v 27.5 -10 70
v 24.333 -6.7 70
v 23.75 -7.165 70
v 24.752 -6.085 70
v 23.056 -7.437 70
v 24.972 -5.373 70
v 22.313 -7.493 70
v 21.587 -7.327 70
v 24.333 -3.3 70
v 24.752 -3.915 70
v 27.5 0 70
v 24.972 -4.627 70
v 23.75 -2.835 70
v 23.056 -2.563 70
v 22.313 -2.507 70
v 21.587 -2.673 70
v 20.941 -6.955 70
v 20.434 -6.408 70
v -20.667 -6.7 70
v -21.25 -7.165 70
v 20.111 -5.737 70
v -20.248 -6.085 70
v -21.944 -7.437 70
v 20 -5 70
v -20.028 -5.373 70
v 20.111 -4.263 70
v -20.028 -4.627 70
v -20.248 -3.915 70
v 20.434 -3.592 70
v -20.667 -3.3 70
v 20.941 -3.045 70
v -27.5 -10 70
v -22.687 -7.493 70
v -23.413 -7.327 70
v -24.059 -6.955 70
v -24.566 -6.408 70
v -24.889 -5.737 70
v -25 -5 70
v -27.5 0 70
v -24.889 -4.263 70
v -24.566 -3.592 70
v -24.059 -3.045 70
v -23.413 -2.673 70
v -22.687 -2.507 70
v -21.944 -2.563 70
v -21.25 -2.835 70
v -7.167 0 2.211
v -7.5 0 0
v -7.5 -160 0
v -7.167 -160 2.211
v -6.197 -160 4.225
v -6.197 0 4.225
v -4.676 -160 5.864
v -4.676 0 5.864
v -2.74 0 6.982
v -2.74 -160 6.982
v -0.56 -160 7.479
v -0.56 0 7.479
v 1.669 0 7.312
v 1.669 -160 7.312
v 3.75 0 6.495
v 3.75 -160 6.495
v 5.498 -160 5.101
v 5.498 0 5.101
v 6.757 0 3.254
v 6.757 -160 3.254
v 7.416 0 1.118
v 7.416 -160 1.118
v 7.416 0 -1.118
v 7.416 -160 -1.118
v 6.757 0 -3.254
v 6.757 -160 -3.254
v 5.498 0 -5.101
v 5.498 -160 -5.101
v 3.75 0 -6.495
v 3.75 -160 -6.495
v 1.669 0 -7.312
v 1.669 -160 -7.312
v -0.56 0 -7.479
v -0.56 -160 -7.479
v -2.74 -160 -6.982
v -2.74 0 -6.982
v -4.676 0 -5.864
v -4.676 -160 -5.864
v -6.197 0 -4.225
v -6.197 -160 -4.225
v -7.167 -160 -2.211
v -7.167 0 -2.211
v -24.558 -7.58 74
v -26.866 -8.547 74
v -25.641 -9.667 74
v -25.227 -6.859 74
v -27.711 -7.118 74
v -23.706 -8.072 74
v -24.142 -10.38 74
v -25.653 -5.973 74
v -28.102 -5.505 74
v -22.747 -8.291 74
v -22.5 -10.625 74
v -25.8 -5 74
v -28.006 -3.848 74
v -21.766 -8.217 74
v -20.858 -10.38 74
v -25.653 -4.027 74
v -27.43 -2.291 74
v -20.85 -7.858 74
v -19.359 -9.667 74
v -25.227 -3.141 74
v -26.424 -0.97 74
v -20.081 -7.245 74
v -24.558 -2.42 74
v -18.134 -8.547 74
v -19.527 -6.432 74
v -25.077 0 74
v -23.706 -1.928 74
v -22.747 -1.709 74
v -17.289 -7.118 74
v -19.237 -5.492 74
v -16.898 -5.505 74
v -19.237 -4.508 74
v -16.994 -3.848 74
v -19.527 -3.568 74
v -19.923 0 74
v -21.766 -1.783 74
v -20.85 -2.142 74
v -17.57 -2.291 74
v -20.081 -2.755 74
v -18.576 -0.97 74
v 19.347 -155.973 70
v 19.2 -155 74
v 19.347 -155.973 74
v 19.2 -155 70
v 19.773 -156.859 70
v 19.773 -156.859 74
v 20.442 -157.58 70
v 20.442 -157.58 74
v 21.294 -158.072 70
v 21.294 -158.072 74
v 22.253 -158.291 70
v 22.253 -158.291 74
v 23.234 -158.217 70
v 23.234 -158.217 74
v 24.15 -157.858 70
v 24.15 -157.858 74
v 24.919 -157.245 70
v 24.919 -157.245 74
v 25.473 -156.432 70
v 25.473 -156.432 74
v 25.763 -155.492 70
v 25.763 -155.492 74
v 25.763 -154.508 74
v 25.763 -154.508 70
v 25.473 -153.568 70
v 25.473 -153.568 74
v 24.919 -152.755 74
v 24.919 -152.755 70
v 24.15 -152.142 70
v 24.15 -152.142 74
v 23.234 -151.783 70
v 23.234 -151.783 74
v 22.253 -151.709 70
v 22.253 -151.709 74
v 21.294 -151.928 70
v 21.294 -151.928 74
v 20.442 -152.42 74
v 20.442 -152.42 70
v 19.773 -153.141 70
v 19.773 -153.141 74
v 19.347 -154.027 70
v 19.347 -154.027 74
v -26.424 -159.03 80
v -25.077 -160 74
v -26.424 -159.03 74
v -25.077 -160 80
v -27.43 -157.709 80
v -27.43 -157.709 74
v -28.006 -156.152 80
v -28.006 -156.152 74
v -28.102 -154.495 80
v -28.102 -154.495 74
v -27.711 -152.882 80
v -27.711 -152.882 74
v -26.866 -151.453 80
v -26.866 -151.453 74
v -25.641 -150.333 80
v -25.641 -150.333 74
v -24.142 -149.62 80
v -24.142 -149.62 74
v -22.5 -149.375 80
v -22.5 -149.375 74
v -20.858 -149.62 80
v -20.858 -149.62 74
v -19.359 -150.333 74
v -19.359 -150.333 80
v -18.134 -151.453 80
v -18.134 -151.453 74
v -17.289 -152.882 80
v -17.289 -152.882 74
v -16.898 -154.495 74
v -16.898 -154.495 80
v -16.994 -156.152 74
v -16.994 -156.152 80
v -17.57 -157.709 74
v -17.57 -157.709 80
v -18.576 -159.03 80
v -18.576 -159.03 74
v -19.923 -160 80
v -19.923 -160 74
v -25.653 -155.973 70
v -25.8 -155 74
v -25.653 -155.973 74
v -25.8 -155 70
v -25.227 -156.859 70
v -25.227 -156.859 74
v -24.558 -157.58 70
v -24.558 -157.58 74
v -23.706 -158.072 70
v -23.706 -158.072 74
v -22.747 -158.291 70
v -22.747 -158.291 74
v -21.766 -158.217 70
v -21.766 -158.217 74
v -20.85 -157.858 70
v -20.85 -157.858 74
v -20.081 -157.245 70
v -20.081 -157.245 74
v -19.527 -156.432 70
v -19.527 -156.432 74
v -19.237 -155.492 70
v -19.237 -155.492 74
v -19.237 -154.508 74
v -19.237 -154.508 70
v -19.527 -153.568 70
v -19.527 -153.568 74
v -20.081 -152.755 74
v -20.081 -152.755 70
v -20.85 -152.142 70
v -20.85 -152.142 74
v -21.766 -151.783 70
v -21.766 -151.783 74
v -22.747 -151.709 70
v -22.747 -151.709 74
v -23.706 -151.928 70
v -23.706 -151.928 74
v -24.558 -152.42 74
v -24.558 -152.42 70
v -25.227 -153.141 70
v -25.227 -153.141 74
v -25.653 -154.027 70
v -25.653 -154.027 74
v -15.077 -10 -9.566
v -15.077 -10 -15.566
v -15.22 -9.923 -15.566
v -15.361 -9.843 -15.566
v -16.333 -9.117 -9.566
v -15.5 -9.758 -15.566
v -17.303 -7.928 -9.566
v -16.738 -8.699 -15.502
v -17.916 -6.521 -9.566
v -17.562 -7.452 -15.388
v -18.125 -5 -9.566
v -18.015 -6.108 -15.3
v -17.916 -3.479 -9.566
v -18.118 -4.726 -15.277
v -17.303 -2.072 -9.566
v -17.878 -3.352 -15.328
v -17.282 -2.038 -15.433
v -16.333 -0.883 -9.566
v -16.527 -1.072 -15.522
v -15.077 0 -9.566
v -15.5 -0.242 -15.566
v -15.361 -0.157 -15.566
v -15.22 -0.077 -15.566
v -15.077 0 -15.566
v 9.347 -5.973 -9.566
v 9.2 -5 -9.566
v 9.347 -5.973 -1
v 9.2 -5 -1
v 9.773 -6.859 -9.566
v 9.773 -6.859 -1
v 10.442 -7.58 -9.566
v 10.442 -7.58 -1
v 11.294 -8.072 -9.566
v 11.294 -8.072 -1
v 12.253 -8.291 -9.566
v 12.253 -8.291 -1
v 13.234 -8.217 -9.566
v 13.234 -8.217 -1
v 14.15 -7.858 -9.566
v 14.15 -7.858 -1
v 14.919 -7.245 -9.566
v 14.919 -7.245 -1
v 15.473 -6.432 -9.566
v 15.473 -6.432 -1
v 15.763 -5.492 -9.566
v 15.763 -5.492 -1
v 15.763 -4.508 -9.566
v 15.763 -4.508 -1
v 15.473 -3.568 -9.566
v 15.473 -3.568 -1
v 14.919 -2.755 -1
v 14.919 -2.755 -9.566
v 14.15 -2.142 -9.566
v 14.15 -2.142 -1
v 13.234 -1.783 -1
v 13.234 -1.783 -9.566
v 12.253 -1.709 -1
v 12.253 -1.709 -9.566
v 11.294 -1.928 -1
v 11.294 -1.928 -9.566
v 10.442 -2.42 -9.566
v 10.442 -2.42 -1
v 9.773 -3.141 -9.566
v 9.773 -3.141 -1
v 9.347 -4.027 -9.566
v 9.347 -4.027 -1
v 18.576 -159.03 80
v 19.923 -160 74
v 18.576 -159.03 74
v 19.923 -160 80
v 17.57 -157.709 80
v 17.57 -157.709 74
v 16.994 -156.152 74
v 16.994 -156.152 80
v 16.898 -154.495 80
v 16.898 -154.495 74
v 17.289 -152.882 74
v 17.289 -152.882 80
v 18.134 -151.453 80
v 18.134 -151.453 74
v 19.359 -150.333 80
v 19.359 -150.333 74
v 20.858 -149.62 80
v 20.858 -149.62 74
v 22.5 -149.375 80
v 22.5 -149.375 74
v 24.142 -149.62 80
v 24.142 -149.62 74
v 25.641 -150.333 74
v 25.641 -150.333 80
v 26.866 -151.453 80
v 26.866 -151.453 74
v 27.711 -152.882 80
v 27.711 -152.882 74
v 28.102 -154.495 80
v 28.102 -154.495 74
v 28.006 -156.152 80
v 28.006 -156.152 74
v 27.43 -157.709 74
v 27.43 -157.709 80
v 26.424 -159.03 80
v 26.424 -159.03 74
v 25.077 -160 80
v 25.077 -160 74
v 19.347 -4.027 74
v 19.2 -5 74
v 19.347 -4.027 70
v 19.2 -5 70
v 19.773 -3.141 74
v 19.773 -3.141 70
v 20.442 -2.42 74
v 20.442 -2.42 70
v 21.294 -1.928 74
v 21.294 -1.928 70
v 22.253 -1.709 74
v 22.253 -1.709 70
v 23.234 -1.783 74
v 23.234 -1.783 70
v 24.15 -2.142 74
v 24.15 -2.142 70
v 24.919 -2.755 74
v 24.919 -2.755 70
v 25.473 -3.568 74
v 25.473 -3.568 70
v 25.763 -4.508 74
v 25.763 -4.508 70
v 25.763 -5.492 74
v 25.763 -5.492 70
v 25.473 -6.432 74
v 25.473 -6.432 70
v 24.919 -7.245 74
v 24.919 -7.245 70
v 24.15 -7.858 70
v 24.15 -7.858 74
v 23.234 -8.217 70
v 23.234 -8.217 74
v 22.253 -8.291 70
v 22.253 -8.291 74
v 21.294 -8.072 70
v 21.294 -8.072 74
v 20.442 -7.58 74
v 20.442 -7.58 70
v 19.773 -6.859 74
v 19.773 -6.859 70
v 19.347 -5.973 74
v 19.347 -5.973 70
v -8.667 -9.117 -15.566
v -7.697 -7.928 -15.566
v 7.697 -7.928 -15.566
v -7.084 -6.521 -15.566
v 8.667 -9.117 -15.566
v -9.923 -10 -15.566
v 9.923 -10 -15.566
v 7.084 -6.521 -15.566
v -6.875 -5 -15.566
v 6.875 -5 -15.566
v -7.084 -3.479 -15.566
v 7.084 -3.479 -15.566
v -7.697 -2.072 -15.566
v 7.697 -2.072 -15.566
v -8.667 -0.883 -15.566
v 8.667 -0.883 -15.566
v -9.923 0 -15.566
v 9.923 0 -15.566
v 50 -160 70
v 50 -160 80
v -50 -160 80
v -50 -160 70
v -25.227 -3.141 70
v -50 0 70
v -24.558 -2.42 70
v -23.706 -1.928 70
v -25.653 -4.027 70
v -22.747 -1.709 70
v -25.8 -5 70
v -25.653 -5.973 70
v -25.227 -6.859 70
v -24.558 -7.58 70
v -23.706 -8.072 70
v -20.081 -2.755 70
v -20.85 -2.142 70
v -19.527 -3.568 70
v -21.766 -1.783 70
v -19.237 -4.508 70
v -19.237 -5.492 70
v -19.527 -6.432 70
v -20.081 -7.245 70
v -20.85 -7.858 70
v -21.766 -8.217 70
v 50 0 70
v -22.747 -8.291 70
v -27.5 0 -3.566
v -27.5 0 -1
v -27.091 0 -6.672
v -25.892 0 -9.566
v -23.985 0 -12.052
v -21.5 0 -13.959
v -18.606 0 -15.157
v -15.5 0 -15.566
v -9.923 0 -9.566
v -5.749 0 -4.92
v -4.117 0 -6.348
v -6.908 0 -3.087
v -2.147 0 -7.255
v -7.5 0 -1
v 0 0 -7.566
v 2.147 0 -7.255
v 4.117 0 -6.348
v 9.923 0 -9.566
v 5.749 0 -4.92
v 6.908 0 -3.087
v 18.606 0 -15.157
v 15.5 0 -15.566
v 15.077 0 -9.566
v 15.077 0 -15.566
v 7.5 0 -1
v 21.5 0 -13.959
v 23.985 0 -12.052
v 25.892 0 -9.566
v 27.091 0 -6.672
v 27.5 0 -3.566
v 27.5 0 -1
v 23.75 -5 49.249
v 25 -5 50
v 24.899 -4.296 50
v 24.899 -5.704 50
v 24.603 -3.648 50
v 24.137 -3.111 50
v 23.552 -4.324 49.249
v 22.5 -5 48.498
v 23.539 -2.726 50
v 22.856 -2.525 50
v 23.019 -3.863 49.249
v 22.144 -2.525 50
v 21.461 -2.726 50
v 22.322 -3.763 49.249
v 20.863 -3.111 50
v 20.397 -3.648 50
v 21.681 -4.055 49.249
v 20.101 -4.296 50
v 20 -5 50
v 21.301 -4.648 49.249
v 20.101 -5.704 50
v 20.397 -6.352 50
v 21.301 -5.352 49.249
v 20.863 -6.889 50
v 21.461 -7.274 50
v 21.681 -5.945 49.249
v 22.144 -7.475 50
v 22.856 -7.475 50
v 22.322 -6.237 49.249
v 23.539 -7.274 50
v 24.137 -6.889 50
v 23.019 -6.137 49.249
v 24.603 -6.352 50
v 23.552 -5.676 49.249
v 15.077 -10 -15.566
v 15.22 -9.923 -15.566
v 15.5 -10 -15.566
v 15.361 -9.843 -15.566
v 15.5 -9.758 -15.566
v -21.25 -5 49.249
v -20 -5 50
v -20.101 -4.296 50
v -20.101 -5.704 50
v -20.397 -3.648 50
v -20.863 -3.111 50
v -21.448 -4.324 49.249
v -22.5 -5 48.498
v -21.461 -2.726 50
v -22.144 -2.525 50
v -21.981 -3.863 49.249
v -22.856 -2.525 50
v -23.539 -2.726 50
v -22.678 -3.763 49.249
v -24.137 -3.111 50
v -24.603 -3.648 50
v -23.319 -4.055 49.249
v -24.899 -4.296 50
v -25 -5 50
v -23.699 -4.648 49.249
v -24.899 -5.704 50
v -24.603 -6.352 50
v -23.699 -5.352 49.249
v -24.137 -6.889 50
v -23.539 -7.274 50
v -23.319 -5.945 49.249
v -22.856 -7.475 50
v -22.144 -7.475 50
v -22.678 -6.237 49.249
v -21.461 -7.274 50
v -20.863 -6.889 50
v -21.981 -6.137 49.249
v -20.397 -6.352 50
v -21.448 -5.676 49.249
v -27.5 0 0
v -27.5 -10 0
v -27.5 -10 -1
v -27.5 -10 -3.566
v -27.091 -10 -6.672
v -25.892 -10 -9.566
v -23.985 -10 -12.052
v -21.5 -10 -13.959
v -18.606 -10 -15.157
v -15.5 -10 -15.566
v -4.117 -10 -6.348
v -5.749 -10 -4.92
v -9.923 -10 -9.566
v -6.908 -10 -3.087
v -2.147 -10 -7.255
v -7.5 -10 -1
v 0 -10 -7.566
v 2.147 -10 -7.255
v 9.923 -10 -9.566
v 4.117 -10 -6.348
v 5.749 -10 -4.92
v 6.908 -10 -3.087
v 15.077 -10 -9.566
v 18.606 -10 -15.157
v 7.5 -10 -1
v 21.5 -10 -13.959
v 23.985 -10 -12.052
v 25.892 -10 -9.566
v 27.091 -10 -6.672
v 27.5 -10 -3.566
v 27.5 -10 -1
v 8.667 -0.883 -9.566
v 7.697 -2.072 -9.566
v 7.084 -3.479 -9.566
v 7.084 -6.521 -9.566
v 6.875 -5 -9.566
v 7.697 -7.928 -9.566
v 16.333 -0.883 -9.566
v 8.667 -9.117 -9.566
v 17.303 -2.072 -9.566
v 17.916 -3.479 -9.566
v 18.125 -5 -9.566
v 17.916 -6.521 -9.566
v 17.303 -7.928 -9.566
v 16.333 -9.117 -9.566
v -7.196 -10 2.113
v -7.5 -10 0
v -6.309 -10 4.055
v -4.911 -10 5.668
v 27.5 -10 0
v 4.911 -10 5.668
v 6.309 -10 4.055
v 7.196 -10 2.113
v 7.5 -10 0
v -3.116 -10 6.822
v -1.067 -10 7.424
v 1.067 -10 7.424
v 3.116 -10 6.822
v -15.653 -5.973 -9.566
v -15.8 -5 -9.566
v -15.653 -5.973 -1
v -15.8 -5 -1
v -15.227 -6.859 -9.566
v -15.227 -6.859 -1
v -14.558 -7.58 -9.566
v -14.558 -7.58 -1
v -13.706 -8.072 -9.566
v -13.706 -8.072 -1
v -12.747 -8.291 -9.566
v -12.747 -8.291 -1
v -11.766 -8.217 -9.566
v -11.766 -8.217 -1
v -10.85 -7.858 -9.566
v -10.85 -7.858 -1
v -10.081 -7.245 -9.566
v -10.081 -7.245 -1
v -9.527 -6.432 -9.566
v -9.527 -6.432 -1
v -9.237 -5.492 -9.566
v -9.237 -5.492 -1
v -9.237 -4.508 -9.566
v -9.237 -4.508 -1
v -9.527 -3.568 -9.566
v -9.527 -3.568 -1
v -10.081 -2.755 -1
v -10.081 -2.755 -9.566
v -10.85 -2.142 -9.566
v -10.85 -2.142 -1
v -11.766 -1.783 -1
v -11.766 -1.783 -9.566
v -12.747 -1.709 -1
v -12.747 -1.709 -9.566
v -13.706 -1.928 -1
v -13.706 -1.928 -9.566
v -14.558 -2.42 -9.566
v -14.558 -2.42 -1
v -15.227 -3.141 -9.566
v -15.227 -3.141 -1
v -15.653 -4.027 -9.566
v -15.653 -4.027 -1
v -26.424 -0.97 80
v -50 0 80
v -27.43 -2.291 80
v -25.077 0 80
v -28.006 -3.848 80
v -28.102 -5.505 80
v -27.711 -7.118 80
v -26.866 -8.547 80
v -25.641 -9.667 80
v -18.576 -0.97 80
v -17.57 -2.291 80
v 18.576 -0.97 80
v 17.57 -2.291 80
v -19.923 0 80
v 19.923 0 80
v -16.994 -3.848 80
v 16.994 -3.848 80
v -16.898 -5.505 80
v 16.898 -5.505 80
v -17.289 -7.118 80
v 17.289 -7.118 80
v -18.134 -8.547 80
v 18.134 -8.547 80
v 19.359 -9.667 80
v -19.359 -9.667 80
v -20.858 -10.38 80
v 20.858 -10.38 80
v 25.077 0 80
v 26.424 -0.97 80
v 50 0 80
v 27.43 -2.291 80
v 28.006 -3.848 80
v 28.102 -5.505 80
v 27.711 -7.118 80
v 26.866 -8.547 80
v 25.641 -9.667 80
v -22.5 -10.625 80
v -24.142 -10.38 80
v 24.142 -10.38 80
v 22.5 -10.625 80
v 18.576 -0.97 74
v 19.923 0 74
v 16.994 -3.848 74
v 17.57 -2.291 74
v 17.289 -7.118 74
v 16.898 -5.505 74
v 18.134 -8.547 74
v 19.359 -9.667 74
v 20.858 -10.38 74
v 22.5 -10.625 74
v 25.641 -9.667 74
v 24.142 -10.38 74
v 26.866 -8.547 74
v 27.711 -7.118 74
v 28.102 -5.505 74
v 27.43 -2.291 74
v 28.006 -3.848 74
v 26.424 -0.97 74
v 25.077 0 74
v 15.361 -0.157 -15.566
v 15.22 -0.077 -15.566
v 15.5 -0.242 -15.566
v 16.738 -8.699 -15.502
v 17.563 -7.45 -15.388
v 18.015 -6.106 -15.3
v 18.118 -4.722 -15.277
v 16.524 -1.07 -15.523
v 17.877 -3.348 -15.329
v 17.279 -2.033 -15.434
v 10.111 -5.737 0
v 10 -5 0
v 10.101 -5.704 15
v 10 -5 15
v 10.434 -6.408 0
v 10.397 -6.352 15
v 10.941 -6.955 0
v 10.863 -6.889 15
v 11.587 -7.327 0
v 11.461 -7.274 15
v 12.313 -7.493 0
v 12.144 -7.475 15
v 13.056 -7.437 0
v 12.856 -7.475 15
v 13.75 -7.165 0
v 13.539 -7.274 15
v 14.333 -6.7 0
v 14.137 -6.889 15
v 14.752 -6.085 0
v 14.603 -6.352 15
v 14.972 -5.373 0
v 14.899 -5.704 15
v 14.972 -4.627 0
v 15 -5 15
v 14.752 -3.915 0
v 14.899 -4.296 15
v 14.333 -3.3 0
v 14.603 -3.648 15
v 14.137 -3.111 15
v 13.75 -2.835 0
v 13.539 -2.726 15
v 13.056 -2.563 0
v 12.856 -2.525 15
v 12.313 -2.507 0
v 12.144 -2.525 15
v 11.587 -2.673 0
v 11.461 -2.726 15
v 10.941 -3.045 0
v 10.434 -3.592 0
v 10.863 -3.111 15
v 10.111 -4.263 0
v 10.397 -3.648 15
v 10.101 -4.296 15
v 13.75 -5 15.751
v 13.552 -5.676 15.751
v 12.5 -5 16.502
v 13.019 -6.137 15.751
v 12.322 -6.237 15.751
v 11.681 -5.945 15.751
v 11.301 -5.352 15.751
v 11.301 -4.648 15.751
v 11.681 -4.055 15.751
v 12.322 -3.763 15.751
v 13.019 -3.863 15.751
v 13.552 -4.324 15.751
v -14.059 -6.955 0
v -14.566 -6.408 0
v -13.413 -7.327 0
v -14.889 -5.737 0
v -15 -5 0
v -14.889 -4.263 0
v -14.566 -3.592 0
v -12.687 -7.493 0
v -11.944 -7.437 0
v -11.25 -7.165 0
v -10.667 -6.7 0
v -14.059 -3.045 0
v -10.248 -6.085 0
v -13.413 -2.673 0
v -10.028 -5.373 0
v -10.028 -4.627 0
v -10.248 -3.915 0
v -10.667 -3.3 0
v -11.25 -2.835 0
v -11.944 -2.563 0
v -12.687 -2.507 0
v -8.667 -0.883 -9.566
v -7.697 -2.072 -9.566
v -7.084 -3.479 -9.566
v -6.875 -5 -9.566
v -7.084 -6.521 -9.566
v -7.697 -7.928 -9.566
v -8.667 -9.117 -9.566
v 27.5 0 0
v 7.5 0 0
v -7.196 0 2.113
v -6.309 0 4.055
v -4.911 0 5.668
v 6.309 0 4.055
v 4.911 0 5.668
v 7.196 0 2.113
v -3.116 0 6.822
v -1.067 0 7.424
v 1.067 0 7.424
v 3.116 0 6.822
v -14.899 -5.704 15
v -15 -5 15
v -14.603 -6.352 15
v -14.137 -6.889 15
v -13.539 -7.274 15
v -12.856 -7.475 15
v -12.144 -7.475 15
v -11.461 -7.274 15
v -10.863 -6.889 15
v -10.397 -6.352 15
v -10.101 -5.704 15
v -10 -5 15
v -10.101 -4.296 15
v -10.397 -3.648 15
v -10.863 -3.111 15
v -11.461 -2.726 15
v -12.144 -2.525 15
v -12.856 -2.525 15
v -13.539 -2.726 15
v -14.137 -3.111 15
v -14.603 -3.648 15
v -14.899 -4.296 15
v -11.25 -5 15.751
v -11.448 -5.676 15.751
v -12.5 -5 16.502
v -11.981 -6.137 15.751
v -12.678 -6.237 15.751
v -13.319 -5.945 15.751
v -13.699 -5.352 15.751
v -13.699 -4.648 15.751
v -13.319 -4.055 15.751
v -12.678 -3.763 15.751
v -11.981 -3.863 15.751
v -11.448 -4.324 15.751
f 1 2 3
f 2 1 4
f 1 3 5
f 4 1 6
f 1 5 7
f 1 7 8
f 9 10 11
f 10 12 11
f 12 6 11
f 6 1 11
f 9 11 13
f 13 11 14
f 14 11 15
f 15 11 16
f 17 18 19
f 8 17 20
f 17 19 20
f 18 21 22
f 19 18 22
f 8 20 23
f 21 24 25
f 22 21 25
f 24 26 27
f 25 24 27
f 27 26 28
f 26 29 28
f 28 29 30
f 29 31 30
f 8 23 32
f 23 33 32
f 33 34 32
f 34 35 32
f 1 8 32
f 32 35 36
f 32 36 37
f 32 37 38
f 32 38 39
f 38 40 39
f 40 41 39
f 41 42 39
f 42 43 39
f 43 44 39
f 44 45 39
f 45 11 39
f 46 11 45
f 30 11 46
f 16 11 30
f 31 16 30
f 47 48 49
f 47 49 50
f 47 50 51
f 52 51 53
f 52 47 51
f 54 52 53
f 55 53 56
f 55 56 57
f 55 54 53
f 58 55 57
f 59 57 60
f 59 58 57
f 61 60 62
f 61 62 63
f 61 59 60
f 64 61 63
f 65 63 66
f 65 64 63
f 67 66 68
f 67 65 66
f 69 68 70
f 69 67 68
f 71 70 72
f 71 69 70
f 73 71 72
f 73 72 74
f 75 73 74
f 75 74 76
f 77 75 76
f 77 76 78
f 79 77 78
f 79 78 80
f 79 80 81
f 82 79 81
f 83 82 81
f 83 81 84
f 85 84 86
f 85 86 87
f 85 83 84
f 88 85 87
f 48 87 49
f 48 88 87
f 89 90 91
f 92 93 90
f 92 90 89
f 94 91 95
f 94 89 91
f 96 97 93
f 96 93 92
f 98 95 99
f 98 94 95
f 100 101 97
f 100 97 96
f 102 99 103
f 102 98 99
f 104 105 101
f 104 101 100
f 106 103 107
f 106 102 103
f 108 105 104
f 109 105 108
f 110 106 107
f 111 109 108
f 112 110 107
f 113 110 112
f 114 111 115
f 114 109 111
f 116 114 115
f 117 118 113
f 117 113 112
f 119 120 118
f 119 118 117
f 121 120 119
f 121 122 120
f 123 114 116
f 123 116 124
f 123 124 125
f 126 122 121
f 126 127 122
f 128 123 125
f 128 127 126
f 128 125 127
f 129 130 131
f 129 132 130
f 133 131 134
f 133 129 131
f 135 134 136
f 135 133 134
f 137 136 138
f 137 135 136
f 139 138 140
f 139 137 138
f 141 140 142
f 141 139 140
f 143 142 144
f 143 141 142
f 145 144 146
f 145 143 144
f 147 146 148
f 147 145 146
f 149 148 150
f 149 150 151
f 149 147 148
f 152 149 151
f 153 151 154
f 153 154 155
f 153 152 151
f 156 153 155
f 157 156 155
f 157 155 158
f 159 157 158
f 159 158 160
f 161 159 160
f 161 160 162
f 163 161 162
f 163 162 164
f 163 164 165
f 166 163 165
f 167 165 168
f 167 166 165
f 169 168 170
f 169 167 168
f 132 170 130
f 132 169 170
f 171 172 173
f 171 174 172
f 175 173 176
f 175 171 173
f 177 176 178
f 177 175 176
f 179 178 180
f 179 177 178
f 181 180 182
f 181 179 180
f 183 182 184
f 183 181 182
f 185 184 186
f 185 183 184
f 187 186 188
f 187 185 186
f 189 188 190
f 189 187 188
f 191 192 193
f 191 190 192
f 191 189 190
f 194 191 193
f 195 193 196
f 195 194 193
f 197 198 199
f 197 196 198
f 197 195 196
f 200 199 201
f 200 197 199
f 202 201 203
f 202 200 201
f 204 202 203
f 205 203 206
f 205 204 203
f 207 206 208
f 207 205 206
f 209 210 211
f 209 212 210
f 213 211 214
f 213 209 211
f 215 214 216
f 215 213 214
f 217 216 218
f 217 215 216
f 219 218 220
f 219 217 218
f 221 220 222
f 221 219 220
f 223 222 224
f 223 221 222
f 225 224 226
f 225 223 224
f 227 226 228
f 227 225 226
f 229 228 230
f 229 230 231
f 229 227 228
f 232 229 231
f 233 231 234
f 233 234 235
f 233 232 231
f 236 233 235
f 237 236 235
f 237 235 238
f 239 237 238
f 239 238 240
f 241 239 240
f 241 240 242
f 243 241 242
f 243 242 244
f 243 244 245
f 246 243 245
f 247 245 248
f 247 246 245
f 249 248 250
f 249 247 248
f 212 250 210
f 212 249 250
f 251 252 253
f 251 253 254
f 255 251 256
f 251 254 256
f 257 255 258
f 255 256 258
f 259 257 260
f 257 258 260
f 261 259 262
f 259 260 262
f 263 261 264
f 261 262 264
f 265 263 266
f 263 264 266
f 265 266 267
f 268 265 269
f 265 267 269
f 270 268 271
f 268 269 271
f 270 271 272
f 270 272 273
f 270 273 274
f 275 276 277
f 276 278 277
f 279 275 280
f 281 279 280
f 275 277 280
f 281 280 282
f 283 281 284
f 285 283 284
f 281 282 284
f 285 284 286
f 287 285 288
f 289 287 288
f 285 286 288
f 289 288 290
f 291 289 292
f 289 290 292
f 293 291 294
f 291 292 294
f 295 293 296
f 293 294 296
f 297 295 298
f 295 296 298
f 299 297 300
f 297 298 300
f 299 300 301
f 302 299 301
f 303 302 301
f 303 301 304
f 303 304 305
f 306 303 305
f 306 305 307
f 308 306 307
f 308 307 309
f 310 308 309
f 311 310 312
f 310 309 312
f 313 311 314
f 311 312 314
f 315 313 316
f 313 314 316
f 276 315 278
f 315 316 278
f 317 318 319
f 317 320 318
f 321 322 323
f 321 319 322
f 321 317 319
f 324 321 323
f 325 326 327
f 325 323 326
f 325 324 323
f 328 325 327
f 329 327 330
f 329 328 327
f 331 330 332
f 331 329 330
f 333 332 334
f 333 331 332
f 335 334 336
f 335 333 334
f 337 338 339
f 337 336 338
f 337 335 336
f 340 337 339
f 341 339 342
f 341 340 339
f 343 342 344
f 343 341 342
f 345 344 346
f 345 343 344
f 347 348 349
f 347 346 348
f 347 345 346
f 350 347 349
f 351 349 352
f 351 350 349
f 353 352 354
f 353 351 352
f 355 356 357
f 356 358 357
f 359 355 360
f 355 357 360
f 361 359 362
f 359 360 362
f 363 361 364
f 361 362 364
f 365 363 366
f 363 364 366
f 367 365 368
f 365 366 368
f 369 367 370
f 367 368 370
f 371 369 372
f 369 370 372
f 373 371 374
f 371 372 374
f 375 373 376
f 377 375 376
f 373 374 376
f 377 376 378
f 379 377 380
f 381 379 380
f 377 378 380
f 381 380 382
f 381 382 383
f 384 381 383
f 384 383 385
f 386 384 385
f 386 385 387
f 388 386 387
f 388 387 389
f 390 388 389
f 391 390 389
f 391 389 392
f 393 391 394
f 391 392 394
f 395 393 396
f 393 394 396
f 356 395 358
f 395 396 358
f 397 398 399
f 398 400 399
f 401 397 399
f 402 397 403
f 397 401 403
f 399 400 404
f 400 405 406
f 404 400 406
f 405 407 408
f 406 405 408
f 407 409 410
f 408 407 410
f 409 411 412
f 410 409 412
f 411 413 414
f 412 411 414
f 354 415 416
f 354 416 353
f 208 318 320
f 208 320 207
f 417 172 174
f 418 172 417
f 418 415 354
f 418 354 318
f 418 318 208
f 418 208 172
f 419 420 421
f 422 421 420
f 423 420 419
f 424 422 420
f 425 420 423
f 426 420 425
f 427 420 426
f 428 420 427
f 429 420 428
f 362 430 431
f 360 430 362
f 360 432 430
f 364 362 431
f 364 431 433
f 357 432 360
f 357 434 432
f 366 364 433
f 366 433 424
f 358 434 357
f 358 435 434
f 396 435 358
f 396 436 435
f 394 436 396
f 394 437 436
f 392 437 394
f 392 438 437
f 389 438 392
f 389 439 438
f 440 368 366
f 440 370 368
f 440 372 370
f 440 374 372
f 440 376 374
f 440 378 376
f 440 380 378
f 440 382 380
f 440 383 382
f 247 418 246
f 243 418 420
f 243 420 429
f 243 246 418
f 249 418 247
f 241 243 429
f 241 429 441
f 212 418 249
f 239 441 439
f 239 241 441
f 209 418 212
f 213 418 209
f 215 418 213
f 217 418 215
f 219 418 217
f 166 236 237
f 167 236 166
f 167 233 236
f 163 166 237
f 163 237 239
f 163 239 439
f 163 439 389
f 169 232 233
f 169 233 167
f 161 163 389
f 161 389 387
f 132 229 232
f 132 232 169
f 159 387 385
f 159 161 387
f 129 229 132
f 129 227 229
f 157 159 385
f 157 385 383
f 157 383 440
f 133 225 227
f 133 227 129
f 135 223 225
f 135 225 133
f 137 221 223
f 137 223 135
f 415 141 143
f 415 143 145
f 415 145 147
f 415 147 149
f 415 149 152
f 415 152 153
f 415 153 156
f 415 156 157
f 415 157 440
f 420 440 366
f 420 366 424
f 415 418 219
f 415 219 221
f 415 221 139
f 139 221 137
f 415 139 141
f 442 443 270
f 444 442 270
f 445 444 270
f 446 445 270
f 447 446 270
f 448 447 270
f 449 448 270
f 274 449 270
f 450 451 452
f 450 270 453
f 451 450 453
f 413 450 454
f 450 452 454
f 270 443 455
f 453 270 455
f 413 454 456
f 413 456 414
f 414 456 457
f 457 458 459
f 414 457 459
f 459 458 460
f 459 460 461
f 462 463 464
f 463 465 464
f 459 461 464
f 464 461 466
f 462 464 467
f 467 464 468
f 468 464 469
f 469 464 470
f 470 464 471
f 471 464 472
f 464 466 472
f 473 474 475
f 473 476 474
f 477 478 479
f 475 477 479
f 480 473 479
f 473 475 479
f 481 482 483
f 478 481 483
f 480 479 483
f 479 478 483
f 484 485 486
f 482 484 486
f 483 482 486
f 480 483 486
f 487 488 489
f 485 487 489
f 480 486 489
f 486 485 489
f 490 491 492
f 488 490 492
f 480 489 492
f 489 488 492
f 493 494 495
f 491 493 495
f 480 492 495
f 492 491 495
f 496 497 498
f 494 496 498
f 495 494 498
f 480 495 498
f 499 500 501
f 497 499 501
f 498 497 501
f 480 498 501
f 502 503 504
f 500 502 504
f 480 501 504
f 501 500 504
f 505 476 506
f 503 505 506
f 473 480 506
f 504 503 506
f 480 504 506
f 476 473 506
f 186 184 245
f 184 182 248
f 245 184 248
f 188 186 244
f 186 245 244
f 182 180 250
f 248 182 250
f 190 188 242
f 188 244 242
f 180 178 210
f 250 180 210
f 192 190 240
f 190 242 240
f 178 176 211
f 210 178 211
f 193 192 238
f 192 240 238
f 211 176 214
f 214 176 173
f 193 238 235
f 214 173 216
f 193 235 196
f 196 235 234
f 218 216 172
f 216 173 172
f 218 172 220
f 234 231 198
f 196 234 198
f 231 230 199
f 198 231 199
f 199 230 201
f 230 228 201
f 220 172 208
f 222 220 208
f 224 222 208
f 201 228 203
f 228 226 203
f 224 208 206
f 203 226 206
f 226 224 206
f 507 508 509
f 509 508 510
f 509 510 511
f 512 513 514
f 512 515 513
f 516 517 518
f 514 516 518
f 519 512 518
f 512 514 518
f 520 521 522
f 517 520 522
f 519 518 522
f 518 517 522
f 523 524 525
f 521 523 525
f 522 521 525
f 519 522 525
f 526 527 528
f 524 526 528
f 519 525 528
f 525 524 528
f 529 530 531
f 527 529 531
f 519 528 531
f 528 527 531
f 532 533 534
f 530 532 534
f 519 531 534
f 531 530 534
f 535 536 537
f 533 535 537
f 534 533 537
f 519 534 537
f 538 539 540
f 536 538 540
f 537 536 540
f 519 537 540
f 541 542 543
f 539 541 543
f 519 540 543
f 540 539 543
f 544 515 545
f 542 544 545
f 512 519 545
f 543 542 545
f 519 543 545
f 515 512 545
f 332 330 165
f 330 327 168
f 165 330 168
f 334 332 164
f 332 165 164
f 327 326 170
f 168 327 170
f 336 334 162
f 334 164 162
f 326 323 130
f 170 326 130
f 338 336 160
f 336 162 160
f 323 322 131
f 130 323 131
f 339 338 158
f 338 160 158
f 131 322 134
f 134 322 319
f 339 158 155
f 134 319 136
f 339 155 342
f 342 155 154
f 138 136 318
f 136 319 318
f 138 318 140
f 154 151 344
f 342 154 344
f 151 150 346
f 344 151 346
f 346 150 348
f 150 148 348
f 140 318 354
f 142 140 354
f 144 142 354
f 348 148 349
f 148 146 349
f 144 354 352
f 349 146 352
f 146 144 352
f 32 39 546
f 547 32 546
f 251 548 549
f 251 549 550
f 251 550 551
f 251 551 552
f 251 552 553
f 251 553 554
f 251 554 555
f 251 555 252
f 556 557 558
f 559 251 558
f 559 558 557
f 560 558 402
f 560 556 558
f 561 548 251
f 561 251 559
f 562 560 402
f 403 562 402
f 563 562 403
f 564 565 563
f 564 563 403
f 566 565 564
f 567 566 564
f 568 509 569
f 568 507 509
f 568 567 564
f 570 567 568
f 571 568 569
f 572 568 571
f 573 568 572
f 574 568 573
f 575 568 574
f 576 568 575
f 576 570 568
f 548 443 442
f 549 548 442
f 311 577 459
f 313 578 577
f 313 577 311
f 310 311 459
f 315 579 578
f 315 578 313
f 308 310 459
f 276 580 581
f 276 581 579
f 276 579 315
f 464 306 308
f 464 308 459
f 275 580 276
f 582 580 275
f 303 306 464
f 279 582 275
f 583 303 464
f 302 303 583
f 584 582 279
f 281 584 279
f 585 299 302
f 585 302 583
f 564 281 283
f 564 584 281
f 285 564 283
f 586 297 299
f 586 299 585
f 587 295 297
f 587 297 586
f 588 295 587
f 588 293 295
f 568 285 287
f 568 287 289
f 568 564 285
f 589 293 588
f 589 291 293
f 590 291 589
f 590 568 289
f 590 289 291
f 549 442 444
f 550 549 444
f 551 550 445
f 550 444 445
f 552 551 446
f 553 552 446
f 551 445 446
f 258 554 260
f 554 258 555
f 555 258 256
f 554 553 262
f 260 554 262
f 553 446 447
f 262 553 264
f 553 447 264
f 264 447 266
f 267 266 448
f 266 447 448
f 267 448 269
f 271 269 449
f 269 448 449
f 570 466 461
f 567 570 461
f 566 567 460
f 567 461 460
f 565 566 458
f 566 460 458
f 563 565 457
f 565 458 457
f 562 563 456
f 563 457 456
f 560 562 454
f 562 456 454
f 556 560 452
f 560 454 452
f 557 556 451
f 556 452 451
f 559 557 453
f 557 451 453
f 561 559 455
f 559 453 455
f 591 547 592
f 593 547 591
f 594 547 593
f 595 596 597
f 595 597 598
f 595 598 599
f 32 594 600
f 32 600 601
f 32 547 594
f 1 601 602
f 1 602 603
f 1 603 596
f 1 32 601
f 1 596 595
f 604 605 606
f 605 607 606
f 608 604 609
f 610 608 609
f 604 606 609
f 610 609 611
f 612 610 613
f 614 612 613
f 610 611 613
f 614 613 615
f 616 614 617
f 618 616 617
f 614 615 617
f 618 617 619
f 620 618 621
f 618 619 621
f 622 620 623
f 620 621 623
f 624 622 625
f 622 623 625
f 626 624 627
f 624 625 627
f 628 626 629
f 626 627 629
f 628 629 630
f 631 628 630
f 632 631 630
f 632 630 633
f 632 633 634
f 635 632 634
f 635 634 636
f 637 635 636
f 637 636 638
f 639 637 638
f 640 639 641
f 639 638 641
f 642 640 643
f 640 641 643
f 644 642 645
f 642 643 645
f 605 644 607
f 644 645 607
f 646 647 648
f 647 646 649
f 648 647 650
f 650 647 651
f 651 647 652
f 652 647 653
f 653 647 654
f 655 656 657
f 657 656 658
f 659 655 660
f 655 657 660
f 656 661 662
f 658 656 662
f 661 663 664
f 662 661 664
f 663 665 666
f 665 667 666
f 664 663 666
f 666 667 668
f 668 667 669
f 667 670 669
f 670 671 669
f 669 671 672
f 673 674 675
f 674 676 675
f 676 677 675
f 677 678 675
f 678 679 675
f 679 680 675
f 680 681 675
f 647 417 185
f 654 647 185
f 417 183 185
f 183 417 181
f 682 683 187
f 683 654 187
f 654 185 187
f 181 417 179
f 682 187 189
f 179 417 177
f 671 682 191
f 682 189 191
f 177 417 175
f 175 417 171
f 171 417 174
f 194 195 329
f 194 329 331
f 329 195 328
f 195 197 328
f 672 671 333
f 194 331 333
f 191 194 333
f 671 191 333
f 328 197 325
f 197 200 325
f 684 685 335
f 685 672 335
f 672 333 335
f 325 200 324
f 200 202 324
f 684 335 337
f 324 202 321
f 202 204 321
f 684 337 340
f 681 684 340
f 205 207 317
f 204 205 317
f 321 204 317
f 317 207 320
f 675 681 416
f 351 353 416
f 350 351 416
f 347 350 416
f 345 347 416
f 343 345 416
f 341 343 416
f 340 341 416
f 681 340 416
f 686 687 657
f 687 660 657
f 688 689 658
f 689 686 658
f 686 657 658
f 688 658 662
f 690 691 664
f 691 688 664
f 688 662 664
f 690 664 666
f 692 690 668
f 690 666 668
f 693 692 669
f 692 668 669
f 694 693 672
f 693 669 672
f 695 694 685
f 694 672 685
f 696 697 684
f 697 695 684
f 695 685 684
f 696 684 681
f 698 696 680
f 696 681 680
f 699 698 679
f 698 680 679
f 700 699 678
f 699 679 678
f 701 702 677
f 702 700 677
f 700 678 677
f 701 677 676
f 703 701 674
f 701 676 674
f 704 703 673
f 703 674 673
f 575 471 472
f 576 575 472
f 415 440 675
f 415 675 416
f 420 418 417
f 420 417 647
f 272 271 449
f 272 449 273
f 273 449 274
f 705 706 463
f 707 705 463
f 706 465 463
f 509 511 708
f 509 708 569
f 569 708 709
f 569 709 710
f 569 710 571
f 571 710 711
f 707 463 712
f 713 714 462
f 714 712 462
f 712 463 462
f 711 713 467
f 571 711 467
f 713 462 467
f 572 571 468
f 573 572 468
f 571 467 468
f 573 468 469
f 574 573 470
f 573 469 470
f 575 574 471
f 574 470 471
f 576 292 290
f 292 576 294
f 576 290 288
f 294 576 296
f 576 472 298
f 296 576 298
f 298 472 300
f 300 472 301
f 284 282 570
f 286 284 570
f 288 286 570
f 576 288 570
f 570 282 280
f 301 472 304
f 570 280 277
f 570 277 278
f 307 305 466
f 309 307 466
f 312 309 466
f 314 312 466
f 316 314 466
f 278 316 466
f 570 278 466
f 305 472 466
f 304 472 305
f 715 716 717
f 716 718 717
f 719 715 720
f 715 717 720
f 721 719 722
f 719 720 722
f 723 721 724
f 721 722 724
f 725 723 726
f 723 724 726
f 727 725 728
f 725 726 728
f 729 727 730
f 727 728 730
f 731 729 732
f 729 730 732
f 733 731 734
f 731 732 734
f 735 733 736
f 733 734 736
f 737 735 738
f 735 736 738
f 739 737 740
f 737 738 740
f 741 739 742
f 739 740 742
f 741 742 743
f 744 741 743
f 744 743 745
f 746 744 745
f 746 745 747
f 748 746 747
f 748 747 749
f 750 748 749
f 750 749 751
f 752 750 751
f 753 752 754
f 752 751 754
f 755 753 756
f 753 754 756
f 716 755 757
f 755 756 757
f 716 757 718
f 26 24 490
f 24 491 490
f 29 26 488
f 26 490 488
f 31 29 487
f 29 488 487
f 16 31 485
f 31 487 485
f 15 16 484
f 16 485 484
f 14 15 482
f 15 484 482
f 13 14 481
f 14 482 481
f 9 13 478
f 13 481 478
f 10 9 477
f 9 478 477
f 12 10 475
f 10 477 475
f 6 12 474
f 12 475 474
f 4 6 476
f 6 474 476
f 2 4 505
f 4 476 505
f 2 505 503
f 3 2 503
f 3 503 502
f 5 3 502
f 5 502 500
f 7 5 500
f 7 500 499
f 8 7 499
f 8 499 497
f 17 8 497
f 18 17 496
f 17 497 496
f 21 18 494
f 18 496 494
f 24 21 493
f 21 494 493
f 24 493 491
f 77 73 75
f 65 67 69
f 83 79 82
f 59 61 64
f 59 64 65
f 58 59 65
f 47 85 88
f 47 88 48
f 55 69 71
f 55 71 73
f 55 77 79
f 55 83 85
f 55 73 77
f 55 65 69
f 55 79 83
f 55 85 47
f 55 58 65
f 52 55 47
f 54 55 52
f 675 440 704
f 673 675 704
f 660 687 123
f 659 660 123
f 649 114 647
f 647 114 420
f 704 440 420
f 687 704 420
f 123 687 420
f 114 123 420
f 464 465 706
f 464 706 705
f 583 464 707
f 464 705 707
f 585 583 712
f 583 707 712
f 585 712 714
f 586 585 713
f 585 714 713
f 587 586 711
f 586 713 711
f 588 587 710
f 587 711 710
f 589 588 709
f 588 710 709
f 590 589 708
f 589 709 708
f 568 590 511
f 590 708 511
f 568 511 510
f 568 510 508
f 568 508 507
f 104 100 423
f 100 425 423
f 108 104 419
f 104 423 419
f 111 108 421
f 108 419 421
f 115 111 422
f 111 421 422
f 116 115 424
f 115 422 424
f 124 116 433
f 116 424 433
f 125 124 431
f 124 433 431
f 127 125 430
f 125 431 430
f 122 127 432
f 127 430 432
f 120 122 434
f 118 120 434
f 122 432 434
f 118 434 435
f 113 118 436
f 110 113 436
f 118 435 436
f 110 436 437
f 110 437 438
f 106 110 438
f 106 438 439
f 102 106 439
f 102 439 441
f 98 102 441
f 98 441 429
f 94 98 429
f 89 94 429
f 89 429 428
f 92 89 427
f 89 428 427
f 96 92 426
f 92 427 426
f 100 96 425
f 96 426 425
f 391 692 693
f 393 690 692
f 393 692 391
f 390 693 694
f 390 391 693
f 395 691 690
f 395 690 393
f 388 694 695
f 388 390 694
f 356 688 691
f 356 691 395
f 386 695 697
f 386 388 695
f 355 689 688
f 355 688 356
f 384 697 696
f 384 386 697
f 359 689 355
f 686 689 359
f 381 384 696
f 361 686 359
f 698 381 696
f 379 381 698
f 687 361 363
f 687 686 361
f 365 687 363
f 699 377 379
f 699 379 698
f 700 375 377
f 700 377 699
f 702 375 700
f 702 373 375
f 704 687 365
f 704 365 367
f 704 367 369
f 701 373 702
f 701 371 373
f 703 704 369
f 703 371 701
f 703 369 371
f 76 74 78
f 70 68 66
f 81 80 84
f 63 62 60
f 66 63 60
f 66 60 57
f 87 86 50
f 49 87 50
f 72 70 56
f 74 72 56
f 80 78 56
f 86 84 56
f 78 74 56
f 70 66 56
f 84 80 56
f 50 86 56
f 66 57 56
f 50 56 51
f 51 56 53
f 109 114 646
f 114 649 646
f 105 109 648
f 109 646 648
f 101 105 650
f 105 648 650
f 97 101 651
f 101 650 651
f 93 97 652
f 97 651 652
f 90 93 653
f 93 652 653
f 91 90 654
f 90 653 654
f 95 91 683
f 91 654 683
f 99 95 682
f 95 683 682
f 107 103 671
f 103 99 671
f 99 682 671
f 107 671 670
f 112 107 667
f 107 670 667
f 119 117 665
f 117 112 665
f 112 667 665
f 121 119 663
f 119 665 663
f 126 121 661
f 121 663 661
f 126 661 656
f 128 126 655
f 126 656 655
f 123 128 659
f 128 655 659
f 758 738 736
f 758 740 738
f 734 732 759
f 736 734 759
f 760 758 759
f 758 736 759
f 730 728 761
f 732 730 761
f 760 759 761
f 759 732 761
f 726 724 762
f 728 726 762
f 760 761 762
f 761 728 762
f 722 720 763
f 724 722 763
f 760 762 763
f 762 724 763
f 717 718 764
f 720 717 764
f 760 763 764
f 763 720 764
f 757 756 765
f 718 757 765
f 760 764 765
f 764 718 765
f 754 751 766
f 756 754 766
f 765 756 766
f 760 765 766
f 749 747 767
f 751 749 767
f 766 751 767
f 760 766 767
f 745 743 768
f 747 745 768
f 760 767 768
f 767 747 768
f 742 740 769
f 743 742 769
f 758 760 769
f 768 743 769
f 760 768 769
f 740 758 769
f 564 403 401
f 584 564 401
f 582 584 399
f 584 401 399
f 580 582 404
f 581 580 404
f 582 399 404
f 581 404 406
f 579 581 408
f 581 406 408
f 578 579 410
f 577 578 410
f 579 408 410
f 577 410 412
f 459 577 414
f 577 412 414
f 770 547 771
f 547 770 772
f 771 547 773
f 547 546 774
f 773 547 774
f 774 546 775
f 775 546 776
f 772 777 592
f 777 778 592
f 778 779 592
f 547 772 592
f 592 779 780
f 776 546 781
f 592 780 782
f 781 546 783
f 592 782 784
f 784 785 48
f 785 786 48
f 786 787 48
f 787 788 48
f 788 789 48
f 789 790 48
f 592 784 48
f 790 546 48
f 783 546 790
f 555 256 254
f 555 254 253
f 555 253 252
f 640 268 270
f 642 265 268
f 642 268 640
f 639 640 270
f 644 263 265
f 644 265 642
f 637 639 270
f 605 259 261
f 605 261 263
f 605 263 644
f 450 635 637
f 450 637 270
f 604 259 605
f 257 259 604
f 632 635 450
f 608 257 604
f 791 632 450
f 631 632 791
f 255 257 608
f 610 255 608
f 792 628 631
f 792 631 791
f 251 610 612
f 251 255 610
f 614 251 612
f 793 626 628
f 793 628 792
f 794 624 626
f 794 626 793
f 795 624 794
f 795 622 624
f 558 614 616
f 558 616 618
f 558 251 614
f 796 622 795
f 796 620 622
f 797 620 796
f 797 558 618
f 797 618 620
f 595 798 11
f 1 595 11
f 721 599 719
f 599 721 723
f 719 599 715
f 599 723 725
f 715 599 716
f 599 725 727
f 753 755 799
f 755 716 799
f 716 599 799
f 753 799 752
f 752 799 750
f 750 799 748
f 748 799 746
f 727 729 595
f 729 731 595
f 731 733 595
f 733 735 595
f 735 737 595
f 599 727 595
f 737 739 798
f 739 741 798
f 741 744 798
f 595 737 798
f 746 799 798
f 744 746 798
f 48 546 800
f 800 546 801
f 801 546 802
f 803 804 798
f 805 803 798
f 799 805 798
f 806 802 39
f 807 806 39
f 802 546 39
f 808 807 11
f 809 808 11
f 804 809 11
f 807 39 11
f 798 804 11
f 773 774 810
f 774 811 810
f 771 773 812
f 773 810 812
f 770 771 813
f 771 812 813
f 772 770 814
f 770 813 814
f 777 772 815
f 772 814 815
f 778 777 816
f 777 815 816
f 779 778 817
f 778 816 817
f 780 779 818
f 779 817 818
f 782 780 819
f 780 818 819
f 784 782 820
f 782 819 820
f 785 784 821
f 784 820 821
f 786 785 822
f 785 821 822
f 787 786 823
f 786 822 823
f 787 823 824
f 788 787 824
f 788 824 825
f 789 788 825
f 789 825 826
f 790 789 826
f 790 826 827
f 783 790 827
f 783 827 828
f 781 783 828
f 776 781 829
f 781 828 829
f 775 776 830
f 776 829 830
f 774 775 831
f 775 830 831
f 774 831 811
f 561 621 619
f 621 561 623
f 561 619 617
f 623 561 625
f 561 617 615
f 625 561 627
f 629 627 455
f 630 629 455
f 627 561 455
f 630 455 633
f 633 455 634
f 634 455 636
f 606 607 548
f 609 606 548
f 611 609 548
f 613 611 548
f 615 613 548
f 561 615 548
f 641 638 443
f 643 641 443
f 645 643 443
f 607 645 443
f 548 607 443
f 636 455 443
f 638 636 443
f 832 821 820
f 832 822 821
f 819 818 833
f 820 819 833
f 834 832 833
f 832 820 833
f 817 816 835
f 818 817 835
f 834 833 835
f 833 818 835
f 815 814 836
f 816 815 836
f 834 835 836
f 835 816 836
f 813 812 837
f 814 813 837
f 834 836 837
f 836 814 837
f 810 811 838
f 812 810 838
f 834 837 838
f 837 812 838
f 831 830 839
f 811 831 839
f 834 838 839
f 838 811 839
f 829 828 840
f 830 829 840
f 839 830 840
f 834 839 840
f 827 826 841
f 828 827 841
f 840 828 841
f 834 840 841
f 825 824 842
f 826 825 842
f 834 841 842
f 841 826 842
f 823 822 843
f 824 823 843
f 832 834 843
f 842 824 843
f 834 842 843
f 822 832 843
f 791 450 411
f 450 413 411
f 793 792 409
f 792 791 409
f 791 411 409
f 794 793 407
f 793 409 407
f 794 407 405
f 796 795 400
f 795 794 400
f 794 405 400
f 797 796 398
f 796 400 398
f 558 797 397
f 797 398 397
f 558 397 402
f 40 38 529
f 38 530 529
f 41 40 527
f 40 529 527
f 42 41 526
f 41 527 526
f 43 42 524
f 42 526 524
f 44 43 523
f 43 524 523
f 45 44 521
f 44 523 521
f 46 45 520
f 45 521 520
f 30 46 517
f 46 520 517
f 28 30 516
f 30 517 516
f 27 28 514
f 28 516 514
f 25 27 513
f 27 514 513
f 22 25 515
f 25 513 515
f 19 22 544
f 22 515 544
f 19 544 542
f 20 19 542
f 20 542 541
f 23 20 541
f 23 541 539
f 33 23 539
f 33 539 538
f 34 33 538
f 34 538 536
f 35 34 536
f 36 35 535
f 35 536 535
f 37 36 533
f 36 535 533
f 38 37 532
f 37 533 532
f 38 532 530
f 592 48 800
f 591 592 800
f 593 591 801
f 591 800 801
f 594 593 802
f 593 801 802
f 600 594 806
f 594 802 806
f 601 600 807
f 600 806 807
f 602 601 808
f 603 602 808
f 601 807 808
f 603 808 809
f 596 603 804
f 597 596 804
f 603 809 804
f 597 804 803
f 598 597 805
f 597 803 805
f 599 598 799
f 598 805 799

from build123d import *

# Parameters (mm, degrees)
F1_DEPTH        = 10
F3_D            = 5
F3_DEPTH        = 20
F3_TIP          = 1.5021515476
F4_W            = 55
F4_H            = 10
F4_R            = 2.5
F5_DEPTH        = 10
F7_D            = 6.6
F7_DEPTH        = 20
F7_CBORE_D      = 11.25
F7_CBORE_DEPTH  = 6
F7_TIP          = 1.9828400428
F10_D           = 5
F10_DEPTH       = 15
F10_TIP         = 1.5021515476
F12_D           = 6.6
F12_DEPTH       = 20
F12_CBORE_D     = 11.25
F12_CBORE_DEPTH = 6
F12_TIP         = 1.9828400428
F14_DEPTH       = 160


with BuildPart() as f1:
    # F0 (on Front) → F1 (new body)
    with BuildSketch(Plane.XZ):
        with BuildLine():
            Line((27.5, 70), (-27.5, 70))
            Line((-27.5, 70), (-27.5, 0))
            Line((-27.5, 0), (-7.5, 0))
            ThreePointArc((-7.5, 0), (0, 7.5), (7.5, 0))
            Line((7.5, 0), (27.5, 0))
            Line((27.5, 0), (27.5, 70))
        make_face()
    extrude(amount=F1_DEPTH)

    # F3
    with Locations(Plane.XY.offset(70)):
        with Locations((-22.5, -5), (22.5, -5)):
            Hole(F3_D / 2, depth=F3_DEPTH)
            with Locations((0, 0, -(F3_DEPTH + F3_TIP / 2))):  # 118° drill point
                Cone(0, F3_D / 2, F3_TIP, mode=Mode.SUBTRACT)

    # F10
    with Locations(Plane(origin=(0, 0, 0), x_dir=(1, 0, 0), z_dir=(0, 0, -1))):
        with Locations((-12.5, 5), (12.5, 5)):
            Hole(F10_D / 2, depth=F10_DEPTH)
            with Locations((0, 0, -(F10_DEPTH + F10_TIP / 2))):  # 118° drill point
                Cone(0, F10_D / 2, F10_TIP, mode=Mode.SUBTRACT)


with BuildPart() as f1b:
    # F0 (on Front) → F1, piece 2 (new body)
    with BuildSketch(Plane.XZ):
        with BuildLine():
            Line((27.5, -3.5663729752), (27.5, -1))
            Line((27.5, -1), (7.5, -1))
            ThreePointArc((7.5, -1), (0, -7.5663729752), (-7.5, -1))
            Line((-7.5, -1), (-27.5, -1))
            Line((-27.5, -1), (-27.5, -3.5663729752))
            ThreePointArc((-27.5, -3.5663729752), (-23.9852813742, -12.0516543494), (-15.5, -15.5663729752))
            Line((-15.5, -15.5663729752), (15.5, -15.5663729752))
            ThreePointArc((15.5, -15.5663729752), (23.9852813742, -12.0516543494), (27.5, -3.5663729752))
        make_face()
    extrude(amount=F1_DEPTH)

    # F12
    with Locations(Plane(origin=(0, 0, -15.5663729752), x_dir=(1, 0, 0), z_dir=(0, 0, -1))):
        with Locations((-12.5, 5), (12.5, 5)):
            CounterBoreHole(F12_D / 2, F12_CBORE_D / 2, F12_CBORE_DEPTH, depth=F12_DEPTH)
            with Locations((0, 0, -(F12_DEPTH + F12_TIP / 2))):  # 118° drill point
                Cone(0, F12_D / 2, F12_TIP, mode=Mode.SUBTRACT)


with BuildPart() as f5:
    # F4 (on face) → F5 (new body)
    with BuildSketch(Plane.XY.offset(70)):
        Polygon((-27.5, 0), (-50, 0), (-50, -80), (50, -80), (50, 0), (27.5, 0), (27.5, -10), (-27.5, -10), align=None)
        with Locations((0, -5)):
            Rectangle(F4_W, F4_H)
        with Locations((-22.5, -5)):
            Circle(F4_R, mode=Mode.SUBTRACT)
        with Locations((22.5, -5)):
            Circle(F4_R, mode=Mode.SUBTRACT)
    extrude(amount=F5_DEPTH)

    # F7
    with Locations(Plane.XY.offset(80)):
        with Locations((-22.5, -5), (22.5, -5)):
            CounterBoreHole(F7_D / 2, F7_CBORE_D / 2, F7_CBORE_DEPTH, depth=F7_DEPTH)
            with Locations((0, 0, -(F7_DEPTH + F7_TIP / 2))):  # 118° drill point
                Cone(0, F7_D / 2, F7_TIP, mode=Mode.SUBTRACT)

    # F8: F5 across face


with BuildPart() as f5_1:
    add(f5.part)
    add(f5.part.mirror(Plane(origin=(0, -80, 75), x_dir=(1, 0, 0), z_dir=(0, -1, 0))))


with BuildPart() as f14:
    # F13 (on face) → F14 (new body, through all)
    with BuildSketch(Plane(origin=(0, 0, 0), x_dir=(-1, 0, 0), z_dir=(0, 1, 0))):
        with BuildLine():
            ThreePointArc((-7.5, 0), (0, -7.5), (7.5, 0))
            ThreePointArc((7.5, 0), (0, 7.5), (-7.5, 0))
        make_face()
    extrude(amount=-F14_DEPTH)


solid = Compound([f1.part, f1b.part, f5_1.part, f14.part])
